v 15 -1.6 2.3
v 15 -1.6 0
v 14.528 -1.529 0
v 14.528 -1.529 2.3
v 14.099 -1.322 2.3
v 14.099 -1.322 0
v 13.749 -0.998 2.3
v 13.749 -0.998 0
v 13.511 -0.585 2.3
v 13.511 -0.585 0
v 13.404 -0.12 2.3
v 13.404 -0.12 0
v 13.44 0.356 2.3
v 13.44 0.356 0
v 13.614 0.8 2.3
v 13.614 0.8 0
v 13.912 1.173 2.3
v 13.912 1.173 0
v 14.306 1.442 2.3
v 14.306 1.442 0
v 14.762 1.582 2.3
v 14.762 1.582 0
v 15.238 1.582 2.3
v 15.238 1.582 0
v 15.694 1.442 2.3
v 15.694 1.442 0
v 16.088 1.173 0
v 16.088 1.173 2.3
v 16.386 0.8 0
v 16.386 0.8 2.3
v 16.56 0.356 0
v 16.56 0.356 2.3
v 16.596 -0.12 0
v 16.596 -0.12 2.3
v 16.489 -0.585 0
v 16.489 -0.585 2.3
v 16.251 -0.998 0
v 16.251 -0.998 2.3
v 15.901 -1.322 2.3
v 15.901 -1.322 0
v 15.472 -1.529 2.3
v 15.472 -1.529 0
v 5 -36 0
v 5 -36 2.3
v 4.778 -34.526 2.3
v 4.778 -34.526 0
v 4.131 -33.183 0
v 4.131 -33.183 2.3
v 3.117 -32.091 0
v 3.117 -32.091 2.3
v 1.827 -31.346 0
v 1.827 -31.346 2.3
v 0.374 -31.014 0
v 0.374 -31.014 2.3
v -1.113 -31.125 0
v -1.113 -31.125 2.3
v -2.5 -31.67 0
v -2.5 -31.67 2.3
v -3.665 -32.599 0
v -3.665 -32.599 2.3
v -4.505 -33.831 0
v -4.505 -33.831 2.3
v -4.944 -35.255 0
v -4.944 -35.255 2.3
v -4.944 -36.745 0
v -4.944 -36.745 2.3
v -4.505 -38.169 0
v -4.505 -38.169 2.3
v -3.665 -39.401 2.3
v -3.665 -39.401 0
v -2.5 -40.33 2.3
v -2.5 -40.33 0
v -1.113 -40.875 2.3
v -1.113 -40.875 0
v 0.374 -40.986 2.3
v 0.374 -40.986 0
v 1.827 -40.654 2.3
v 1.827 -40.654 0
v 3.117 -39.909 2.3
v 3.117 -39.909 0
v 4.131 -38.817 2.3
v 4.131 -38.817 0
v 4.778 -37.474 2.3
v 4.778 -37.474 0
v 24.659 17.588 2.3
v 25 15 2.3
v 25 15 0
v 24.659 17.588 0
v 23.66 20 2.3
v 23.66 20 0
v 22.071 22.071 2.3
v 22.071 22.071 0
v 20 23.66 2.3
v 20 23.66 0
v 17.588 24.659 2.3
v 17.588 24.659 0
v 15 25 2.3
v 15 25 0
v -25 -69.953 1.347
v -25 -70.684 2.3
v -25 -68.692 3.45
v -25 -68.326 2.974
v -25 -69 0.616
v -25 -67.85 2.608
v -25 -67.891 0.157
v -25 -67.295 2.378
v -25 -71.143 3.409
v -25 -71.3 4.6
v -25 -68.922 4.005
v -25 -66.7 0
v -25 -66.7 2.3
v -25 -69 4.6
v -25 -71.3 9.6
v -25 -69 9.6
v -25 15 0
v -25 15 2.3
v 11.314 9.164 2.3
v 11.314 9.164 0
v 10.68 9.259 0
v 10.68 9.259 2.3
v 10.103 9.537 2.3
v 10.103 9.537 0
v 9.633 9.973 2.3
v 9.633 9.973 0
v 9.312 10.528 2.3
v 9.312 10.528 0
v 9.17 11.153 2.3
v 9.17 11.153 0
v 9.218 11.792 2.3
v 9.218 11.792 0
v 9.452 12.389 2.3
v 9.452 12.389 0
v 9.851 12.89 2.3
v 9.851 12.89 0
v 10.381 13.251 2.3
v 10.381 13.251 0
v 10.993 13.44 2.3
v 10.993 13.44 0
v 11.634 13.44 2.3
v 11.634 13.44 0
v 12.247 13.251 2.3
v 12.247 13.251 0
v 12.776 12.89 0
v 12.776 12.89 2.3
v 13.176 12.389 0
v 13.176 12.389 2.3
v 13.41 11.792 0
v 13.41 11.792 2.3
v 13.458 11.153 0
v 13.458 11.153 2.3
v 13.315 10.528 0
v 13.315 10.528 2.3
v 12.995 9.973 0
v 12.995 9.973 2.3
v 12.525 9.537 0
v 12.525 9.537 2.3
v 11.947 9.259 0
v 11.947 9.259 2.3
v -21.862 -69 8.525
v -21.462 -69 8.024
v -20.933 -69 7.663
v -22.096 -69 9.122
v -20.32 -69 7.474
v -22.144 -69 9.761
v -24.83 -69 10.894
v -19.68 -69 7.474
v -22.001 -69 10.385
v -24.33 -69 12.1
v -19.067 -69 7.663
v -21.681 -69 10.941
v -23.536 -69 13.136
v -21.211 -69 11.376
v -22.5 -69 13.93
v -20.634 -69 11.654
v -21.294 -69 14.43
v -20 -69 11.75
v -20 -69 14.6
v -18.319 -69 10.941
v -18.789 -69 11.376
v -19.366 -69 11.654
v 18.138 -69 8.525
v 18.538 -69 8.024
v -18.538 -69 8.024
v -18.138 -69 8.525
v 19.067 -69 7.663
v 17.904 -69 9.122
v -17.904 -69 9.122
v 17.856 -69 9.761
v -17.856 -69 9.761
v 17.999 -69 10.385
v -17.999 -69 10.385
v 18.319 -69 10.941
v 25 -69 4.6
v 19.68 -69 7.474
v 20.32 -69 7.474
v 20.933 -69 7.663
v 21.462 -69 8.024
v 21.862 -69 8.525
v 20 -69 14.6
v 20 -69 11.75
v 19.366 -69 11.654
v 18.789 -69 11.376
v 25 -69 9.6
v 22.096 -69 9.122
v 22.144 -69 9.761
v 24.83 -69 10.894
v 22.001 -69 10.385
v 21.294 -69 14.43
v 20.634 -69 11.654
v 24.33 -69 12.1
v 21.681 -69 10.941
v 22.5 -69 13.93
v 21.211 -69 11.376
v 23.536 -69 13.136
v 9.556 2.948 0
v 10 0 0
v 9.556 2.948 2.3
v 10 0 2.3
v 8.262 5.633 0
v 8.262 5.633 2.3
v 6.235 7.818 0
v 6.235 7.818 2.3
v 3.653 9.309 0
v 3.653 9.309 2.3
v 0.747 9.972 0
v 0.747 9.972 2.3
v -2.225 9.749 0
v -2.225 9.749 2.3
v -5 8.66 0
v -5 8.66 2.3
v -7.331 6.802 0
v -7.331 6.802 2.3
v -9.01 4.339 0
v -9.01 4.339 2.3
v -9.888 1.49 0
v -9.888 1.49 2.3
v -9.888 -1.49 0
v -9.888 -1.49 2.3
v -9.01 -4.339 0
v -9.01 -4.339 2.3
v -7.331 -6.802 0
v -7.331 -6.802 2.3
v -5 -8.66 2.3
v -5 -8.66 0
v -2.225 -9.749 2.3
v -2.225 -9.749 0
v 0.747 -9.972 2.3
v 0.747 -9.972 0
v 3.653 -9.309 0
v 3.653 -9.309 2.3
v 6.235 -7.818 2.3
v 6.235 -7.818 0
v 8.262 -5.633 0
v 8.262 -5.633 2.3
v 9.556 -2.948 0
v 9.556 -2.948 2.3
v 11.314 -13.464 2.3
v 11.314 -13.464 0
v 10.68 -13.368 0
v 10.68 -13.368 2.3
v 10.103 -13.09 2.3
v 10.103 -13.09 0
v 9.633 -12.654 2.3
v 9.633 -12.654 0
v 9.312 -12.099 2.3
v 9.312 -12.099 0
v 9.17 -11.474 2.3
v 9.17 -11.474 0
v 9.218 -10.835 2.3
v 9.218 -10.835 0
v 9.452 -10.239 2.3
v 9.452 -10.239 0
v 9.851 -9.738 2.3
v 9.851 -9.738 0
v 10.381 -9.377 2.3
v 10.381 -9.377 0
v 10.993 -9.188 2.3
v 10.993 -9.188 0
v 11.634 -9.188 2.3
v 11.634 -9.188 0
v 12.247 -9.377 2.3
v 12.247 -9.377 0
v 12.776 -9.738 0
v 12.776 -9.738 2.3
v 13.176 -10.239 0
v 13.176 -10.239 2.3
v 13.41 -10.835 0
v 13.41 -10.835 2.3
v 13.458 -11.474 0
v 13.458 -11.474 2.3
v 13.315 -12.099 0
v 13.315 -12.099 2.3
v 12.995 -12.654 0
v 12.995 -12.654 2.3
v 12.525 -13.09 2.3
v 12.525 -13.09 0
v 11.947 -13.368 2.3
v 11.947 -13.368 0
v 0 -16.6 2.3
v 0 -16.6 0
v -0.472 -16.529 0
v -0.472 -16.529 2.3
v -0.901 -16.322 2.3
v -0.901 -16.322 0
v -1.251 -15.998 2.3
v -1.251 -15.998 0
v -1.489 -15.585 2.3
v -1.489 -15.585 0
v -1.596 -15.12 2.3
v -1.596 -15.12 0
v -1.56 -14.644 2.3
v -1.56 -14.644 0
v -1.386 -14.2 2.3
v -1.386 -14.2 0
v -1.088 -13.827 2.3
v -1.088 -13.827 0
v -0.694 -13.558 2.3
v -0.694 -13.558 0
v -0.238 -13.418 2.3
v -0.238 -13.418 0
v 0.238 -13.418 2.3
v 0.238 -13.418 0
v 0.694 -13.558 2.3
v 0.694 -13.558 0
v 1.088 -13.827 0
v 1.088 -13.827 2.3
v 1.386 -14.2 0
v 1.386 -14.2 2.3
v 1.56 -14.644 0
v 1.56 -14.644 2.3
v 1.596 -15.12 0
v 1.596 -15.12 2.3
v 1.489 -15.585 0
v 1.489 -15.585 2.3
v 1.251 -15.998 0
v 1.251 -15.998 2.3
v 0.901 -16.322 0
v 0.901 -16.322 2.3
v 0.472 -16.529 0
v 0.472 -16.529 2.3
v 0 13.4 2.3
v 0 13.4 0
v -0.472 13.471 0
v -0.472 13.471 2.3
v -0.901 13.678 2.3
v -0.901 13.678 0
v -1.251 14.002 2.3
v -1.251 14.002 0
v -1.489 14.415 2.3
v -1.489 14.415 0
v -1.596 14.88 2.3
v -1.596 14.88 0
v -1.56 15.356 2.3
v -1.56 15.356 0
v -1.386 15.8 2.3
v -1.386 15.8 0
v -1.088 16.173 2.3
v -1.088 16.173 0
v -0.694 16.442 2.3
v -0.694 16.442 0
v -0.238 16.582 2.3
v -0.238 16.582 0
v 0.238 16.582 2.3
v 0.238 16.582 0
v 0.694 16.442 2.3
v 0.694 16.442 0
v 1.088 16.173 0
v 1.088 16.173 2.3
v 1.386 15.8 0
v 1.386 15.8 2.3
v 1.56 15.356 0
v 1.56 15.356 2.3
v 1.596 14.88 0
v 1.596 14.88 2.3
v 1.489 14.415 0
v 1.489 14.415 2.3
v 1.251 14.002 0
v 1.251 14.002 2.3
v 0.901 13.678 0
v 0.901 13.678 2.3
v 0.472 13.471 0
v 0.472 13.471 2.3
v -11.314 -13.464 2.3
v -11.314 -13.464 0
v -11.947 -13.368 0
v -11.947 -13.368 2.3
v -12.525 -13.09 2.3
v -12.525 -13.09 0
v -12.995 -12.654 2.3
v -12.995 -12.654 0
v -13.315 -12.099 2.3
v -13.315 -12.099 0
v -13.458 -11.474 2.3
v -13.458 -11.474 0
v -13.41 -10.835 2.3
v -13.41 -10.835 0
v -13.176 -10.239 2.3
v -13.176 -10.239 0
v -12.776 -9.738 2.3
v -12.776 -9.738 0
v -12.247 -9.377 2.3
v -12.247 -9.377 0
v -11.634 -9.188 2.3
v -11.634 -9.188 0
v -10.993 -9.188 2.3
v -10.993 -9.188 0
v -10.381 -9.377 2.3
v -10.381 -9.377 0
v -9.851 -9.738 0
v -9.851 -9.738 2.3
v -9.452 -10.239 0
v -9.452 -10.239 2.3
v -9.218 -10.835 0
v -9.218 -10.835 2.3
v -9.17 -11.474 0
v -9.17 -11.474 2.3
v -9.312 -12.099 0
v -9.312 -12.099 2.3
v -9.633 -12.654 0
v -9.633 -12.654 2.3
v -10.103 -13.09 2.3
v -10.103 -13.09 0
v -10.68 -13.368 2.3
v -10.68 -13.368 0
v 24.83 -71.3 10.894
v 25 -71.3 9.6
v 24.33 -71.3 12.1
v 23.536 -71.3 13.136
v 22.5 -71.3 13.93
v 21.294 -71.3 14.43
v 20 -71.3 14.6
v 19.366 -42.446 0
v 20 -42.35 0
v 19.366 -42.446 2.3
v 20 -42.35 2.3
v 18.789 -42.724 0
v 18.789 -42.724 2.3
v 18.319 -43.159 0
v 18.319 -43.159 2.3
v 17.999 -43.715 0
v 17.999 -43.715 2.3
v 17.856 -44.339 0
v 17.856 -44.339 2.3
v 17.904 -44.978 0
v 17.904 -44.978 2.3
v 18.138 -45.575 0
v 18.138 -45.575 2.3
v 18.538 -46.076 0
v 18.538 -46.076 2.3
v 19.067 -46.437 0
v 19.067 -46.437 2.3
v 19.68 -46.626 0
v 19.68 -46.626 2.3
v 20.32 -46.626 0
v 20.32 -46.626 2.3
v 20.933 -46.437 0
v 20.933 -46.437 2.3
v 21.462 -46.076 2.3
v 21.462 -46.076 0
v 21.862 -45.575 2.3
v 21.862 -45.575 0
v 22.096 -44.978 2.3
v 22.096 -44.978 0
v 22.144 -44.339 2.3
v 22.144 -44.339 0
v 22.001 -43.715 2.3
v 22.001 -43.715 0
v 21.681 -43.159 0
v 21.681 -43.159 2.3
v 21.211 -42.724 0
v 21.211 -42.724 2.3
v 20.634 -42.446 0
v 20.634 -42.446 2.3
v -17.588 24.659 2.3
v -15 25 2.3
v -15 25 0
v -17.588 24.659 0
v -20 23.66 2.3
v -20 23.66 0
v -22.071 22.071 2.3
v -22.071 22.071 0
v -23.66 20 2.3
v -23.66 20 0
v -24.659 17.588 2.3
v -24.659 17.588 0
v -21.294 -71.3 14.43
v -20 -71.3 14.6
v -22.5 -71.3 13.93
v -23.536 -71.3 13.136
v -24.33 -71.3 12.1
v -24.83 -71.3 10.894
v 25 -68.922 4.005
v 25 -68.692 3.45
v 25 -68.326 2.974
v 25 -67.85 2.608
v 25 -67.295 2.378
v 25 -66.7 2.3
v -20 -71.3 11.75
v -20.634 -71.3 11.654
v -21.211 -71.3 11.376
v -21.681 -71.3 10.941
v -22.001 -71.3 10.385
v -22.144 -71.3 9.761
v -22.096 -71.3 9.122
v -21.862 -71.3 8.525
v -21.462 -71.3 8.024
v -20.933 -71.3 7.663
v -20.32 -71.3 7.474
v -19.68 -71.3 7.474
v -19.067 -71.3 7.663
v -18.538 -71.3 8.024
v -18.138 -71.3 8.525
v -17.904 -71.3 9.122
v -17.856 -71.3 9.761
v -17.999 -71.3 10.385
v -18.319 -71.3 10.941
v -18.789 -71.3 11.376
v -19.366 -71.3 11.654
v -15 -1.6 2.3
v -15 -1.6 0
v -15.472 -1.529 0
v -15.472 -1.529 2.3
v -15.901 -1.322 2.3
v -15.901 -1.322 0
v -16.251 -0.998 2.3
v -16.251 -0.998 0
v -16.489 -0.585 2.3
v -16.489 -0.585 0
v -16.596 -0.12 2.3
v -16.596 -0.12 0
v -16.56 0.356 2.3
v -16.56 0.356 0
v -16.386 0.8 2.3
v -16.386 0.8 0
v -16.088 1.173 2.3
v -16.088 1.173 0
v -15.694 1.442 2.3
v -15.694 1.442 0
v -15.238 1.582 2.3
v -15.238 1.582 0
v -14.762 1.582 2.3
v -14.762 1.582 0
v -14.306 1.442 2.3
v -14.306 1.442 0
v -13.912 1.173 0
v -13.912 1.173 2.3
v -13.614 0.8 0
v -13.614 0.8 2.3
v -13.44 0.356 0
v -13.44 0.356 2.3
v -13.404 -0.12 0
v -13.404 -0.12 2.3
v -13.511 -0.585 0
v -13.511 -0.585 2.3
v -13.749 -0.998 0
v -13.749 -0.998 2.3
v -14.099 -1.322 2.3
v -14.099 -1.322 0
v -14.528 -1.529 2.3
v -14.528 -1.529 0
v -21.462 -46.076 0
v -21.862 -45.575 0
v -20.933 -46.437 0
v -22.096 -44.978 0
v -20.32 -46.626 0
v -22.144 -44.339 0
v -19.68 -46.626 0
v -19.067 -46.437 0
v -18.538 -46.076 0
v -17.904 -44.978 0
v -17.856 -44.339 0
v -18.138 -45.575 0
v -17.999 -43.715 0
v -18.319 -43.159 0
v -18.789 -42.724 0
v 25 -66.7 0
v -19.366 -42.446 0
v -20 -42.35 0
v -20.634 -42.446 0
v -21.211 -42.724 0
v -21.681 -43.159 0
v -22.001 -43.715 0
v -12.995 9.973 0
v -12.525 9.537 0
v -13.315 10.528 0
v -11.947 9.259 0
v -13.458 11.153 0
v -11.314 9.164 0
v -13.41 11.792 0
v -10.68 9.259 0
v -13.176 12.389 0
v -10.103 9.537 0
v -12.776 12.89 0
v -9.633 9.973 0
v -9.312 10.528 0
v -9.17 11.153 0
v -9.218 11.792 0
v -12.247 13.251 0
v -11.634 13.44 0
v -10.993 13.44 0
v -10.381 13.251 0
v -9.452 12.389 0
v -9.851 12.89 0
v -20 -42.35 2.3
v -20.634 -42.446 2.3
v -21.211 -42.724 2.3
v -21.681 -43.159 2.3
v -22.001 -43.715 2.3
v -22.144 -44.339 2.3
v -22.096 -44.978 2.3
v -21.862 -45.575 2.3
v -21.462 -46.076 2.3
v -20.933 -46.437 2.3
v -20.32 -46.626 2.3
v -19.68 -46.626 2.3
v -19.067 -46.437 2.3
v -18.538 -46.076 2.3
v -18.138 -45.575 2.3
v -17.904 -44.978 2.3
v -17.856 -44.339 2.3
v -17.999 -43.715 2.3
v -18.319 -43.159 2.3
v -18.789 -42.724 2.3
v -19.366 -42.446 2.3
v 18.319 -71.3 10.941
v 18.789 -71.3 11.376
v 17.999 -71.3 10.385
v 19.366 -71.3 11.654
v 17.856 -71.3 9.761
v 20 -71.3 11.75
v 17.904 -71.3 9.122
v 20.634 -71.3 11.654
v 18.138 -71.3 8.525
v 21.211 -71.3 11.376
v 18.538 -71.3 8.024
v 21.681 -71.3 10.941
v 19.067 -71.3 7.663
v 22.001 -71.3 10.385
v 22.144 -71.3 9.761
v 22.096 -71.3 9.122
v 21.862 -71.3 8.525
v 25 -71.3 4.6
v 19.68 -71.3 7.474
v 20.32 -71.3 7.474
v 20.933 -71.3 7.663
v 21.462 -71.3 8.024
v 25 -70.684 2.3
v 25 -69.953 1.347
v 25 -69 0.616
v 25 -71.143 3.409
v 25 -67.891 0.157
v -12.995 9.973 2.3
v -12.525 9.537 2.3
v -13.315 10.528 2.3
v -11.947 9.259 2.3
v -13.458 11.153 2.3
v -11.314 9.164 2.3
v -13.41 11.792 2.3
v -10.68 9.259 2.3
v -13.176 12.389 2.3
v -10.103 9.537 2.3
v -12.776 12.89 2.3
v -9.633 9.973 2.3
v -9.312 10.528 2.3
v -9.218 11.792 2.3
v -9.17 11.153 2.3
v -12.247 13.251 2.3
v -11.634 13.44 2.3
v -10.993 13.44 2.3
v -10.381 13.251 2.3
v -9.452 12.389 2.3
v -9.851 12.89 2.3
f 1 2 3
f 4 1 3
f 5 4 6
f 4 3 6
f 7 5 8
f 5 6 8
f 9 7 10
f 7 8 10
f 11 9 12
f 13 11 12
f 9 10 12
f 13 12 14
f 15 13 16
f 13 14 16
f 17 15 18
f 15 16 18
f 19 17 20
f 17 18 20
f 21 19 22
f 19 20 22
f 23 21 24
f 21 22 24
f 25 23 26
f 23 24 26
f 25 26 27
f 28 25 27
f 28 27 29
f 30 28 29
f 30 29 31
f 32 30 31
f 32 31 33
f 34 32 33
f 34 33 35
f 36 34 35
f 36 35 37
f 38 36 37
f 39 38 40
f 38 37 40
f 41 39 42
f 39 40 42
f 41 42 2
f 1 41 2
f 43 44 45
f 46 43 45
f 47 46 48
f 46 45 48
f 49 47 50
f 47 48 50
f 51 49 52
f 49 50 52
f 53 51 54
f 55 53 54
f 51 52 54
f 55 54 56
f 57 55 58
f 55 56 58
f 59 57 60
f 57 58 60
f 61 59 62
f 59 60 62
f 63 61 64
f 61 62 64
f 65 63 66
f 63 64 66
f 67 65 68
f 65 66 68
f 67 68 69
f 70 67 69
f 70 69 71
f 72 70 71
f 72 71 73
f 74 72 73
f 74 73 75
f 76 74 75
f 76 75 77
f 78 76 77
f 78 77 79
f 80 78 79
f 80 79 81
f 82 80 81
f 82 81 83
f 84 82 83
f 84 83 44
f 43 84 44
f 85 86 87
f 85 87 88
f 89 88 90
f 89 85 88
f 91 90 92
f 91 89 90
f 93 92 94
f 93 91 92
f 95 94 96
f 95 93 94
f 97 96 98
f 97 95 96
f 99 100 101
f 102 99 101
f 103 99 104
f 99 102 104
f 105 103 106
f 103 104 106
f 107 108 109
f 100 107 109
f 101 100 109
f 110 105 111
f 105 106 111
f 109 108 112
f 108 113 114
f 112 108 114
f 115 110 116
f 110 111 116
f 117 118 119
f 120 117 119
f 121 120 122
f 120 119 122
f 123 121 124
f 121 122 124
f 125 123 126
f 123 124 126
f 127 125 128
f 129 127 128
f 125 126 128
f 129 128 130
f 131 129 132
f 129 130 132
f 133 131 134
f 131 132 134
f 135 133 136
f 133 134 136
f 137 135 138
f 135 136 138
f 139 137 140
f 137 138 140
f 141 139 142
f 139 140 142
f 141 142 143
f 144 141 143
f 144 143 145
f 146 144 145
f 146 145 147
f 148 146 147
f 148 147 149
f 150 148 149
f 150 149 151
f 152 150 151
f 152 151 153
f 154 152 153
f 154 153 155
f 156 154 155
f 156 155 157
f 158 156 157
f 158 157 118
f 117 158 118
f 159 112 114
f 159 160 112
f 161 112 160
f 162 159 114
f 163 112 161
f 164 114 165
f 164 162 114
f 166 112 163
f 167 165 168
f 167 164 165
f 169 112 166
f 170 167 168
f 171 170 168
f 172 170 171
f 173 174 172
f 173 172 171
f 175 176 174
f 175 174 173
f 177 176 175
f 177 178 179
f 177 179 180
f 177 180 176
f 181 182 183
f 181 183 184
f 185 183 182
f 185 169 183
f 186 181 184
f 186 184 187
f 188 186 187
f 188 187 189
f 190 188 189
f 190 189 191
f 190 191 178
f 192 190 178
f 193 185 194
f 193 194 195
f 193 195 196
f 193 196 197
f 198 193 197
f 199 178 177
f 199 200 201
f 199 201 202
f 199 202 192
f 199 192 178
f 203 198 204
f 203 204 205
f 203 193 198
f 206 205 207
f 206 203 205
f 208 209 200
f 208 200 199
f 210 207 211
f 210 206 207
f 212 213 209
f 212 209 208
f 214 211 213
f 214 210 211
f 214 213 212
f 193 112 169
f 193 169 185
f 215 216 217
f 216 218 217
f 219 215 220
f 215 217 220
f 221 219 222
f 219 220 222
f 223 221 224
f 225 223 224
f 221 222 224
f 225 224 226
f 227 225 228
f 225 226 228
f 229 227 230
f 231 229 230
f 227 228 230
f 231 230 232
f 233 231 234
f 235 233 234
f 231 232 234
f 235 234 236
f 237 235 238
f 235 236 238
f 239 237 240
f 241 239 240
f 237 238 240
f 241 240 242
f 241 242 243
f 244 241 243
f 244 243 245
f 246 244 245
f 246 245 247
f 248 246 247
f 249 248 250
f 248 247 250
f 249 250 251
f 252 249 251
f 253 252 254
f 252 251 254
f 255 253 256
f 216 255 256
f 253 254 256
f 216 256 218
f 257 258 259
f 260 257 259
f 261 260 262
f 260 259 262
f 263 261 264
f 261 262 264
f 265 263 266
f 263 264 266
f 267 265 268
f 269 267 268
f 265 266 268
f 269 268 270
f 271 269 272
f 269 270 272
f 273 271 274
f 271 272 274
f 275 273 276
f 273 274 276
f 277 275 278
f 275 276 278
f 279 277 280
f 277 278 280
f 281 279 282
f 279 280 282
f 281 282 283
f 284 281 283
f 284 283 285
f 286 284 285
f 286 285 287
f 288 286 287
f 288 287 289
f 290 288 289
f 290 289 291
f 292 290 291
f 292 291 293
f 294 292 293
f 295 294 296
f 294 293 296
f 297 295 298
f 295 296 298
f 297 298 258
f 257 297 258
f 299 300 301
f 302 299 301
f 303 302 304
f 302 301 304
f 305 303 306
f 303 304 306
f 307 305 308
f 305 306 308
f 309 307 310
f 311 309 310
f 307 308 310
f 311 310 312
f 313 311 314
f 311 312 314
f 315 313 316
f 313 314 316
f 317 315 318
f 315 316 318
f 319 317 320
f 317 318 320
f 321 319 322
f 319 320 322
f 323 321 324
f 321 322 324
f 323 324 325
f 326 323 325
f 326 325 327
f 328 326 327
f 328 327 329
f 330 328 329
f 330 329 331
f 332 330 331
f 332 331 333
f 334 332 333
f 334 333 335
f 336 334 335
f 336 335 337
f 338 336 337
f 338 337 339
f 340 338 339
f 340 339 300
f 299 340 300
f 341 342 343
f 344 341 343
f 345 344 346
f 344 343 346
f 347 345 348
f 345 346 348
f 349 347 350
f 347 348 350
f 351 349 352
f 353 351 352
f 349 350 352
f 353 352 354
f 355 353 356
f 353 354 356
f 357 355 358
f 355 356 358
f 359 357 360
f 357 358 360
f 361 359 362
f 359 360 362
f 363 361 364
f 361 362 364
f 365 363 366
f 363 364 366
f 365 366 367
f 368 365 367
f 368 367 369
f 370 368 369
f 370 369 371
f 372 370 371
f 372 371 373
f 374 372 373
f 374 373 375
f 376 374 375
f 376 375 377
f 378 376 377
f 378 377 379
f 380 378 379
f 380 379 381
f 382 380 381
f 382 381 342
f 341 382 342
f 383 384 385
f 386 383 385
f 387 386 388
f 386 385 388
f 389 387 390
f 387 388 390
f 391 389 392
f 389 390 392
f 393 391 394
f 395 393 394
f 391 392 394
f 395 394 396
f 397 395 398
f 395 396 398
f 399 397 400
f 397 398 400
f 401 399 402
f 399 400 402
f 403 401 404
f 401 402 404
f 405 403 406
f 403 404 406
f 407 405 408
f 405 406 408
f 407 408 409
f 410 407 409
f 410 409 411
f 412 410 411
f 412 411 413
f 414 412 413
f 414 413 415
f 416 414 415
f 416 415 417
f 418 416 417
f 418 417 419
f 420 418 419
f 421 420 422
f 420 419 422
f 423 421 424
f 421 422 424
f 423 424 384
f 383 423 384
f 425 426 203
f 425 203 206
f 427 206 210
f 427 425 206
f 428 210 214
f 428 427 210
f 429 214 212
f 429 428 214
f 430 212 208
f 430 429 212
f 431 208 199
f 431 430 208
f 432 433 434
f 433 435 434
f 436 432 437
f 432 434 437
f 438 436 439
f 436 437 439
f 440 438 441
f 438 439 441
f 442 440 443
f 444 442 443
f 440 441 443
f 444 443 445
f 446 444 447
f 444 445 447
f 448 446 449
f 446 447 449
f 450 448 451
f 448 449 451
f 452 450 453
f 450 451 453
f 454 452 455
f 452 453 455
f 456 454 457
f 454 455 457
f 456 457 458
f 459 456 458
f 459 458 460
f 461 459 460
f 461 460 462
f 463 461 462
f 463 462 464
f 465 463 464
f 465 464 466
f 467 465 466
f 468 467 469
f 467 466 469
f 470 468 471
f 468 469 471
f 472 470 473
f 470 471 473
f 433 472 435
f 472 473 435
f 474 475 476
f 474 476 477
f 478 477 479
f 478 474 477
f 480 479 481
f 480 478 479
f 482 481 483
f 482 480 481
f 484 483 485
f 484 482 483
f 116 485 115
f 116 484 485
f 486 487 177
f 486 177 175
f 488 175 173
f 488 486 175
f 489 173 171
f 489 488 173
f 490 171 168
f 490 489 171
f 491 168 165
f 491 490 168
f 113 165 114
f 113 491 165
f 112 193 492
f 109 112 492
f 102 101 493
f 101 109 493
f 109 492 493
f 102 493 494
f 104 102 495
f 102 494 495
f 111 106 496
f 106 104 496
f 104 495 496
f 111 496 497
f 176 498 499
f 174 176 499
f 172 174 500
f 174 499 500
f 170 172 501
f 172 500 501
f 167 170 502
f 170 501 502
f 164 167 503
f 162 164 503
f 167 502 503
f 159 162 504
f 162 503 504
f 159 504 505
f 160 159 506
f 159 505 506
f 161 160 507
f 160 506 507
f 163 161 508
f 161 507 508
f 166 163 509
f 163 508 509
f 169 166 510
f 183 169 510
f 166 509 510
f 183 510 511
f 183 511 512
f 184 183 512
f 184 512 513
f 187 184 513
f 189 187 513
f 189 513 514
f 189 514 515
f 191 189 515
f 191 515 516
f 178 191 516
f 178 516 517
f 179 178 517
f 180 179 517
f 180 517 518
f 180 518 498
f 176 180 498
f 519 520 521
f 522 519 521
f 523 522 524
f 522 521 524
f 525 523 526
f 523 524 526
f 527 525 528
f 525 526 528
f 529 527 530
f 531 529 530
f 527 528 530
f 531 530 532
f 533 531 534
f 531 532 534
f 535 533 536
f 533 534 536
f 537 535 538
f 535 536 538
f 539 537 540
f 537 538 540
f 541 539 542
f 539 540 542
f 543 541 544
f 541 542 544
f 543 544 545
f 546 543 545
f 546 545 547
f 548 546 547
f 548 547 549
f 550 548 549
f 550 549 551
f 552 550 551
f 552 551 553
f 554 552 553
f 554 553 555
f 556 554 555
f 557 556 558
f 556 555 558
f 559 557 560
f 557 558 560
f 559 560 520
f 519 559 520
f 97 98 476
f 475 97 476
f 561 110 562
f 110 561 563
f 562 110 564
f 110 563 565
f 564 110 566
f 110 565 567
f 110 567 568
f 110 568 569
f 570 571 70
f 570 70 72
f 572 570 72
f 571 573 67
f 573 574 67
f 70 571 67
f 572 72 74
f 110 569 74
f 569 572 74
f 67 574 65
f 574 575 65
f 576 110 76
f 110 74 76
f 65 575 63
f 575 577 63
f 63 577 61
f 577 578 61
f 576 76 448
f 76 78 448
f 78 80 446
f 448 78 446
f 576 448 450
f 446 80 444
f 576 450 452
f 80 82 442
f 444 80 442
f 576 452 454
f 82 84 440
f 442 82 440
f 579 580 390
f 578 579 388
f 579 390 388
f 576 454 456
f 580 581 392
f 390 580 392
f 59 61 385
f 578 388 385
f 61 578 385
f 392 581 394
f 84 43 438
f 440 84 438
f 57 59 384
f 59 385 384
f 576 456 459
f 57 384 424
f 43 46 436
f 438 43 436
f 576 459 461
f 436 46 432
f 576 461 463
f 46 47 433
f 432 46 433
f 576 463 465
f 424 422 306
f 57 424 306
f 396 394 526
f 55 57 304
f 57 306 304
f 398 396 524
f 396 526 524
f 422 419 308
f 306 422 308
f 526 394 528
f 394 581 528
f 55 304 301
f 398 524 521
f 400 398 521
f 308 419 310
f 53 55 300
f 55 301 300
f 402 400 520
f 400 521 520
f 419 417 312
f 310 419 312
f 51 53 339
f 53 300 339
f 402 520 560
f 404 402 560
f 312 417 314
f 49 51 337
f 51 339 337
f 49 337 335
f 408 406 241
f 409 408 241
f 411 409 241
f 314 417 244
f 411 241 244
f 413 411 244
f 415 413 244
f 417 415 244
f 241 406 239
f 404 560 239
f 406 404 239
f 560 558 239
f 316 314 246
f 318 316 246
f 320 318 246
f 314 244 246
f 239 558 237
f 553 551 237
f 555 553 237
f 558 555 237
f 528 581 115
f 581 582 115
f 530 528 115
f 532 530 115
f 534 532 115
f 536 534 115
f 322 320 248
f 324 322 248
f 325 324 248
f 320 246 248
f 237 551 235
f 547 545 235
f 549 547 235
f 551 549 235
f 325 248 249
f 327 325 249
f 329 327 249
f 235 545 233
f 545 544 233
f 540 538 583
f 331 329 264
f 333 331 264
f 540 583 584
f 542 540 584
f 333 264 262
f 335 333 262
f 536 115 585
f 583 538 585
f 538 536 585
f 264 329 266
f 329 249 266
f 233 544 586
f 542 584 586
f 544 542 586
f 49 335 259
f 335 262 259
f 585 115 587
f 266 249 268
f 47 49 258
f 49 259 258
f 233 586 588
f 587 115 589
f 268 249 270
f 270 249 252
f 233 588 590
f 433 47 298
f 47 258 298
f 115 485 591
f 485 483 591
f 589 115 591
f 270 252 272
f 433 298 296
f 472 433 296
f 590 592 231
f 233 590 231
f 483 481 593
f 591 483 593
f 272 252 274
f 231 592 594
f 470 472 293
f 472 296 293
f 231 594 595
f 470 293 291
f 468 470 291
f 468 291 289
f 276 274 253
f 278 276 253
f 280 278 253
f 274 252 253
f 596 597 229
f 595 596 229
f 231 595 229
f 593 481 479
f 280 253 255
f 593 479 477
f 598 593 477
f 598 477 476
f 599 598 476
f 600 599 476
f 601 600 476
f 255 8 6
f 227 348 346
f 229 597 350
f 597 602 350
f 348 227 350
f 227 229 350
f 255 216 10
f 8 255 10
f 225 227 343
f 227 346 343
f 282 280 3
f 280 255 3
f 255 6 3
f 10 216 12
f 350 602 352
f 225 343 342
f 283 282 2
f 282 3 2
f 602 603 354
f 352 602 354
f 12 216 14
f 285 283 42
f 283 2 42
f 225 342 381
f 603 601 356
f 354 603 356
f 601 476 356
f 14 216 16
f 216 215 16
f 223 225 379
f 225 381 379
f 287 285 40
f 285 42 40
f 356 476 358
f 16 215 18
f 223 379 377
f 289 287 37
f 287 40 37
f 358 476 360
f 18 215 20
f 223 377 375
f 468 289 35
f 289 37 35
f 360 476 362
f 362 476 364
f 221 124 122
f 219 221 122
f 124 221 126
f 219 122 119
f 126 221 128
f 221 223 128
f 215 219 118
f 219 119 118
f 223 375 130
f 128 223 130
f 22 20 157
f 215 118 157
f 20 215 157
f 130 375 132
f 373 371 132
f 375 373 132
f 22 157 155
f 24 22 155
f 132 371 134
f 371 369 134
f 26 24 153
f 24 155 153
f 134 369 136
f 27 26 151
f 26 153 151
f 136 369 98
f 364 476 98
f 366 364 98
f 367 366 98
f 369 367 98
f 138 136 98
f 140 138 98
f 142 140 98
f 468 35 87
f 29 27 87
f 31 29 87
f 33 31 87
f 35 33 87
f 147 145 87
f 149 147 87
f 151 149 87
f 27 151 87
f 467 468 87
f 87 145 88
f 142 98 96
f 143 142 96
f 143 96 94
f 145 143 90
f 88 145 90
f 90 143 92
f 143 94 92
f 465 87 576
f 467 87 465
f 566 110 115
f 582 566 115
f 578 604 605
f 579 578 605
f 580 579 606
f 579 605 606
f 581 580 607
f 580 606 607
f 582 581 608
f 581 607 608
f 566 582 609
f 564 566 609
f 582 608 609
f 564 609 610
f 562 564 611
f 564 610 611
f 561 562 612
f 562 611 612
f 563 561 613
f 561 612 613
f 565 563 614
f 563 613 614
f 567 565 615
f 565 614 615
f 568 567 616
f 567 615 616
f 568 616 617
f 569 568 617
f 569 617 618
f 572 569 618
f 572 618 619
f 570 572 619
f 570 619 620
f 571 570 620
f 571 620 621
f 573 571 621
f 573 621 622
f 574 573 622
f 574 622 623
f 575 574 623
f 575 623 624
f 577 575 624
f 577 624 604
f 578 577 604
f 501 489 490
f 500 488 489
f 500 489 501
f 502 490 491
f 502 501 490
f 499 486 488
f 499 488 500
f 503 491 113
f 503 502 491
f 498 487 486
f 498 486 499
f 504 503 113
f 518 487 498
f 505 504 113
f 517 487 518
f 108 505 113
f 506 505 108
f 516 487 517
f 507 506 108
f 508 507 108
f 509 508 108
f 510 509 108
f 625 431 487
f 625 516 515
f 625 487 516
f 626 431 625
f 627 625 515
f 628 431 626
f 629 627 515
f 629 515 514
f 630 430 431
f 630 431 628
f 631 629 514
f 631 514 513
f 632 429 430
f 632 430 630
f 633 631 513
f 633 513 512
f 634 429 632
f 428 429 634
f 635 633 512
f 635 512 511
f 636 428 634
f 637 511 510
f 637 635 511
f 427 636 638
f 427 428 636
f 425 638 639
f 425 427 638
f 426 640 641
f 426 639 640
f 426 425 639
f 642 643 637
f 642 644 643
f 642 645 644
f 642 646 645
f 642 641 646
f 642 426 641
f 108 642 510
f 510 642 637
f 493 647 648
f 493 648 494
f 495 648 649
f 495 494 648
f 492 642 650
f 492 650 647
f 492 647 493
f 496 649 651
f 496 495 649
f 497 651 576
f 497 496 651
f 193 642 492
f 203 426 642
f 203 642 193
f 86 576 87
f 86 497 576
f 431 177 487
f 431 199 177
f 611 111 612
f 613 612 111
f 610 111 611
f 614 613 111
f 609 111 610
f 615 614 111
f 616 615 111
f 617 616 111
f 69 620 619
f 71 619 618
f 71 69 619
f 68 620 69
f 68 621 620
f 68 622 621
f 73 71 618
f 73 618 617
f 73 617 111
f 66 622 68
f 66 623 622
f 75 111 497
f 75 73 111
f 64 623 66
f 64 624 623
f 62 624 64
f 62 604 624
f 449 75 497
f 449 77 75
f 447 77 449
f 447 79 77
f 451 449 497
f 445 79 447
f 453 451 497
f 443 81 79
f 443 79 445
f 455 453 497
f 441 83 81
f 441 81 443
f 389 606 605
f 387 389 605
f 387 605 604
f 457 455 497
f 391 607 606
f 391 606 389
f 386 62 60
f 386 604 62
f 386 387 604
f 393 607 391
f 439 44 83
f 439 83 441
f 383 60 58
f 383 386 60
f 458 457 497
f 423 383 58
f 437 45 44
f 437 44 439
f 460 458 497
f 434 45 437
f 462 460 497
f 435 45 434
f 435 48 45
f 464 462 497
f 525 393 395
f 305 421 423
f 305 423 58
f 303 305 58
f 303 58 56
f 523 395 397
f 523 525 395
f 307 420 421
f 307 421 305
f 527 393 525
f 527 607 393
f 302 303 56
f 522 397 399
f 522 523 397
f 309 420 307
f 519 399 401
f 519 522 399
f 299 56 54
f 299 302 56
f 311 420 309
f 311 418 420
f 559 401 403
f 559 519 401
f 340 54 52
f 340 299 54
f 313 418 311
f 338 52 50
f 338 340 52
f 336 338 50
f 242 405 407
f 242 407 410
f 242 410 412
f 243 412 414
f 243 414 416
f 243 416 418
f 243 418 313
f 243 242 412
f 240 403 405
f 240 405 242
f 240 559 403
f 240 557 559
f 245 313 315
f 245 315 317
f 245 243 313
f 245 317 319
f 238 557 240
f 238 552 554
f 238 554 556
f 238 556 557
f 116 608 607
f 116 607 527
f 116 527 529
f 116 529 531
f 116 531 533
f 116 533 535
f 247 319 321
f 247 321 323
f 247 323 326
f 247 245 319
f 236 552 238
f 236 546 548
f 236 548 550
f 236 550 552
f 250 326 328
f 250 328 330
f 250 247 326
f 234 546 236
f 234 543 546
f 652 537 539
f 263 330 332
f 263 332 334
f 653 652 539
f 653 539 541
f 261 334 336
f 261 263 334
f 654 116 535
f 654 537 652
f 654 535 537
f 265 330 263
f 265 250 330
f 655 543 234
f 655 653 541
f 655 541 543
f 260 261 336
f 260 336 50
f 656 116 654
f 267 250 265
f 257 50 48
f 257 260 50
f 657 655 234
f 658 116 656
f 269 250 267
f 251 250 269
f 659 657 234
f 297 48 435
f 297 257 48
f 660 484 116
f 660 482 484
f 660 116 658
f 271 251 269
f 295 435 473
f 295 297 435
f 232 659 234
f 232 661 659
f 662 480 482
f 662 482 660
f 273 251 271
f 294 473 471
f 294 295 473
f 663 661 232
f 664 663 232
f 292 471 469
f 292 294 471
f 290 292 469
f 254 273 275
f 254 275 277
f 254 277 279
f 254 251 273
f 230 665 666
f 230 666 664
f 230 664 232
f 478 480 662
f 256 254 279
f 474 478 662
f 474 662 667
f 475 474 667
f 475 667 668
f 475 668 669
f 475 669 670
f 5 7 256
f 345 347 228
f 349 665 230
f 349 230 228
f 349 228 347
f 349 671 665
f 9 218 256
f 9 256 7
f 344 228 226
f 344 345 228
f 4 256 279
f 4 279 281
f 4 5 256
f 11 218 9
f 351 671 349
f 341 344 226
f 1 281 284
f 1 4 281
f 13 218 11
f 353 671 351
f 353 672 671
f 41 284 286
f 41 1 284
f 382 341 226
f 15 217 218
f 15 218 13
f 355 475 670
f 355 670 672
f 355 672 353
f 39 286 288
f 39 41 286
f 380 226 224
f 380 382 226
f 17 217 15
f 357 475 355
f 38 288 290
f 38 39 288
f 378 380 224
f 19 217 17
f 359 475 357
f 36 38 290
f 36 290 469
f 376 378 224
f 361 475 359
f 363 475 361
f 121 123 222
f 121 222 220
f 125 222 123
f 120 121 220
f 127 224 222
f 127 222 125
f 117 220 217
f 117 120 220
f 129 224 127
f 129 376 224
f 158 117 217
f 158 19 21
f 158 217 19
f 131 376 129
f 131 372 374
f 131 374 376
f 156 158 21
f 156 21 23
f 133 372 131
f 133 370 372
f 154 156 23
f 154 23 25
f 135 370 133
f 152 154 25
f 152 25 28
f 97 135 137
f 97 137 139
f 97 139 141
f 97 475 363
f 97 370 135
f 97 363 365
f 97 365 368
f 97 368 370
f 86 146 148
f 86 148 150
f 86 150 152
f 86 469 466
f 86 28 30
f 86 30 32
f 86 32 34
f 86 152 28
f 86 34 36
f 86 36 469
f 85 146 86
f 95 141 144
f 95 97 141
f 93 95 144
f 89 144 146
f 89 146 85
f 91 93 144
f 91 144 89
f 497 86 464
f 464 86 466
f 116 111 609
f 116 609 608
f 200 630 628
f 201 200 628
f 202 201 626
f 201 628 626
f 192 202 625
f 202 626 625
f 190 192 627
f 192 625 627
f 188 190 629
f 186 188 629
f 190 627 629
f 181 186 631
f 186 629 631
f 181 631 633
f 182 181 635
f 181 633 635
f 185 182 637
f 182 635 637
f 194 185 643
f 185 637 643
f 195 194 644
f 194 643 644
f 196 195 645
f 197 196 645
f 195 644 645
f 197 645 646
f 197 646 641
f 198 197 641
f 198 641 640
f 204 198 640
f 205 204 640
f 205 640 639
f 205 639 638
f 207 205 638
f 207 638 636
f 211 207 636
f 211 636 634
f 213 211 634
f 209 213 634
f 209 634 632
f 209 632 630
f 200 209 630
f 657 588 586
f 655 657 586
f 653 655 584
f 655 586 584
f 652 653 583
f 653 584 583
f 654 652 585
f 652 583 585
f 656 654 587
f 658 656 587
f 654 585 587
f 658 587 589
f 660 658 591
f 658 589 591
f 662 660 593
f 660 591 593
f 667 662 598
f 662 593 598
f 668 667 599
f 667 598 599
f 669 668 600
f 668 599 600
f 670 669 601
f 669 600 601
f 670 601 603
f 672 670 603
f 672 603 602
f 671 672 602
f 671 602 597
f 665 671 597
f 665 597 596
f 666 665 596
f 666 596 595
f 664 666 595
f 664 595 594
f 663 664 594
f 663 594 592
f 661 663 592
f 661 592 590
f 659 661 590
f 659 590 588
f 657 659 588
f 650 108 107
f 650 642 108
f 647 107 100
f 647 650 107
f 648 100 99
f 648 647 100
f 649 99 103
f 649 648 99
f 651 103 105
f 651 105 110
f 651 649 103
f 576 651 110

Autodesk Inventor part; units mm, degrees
ref_plane "YZ Plane" through (0, 0, 0) normal (1, 0, 0) x (0, 1, 0)
ref_plane "XZ Plane" through (0, 0, 0) normal (0, 1, 0) x (-1, 0, 0)
ref_plane "XY Plane" through (0, 0, 0) normal (0, 0, 1) x (1, 0, 0)
sketch "スケッチ1" plane through (0, 0, 0) normal (0, 0, 1) x (1, 0, 0)
  line L0 (-25, -71.3) -> (25, -71.3)
  line L1 (25, -71.3) -> (25, 25)
  line L2 (25, 25) -> (-25, 25)
  line L3 (-25, 25) -> (-25, -71.3)
  line L4 (-25, -71.3) -> (25, 25) construction
  line L5 (25, -71.3) -> (-25, 25) construction
  circle A0 centre (0, 0) radius 19 construction
  point P0 (0, -23.15)
  point P1 (0, -23.15)
  dimension "d0" = 38
  dimension "d1" = 50
  dimension "d2" = 25
  dimension "d3" = 71.3
extrude "プレート1" add sketch "スケッチ1" along normal blind 2.3
sketch "スケッチ9" plane through (25, -69, 0) normal (0, -1, 0) x (1, 0, 0)
  line L0 (-50, 0) -> (0, 0)
  line L1 (0, 0) -> (0, 14.6)
  line L2 (0, 14.6) -> (-50, 14.6)
  line L3 (-50, 14.6) -> (-50, 0)
edge flange "フランジ3" height 14.6 angle 90 thickness 2.3 bend radius 2.3 thickness toward (0, -1, 0) relief tear relief width 2.3 relief depth 1.15 edges at (0, -71.3, 2.3) wall of the first edge with corners at (-25, -69, 0) (25, -69, 0) (25, -69, 14.6) (-25, -69, 14.6)
bend "曲げ3"
corner "コーナー3"
fillet "コーナーR1" radius 5 2 edges at (25, -70.15, 14.6) (-25, -70.15, 14.6)
sketch "スケッチ4" plane through (0, 0, 2.3) normal (0, 0, 1) x (1, 0, 0)
  circle A0 centre (0, 0) radius 15
  point P0 (0, 15)
  point P1 (-15, 0)
  point P2 (0, -15)
  point P3 (15, 0)
  dimension "d26" = 30
  dimension "d29" = 360
hole "穴1" at (0, 15, 2.3) at (-15, 0, 2.3) at (0, -15, 2.3) at (15, 0, 2.3) direction (0, 0, -1) diameter 3.2 end through all clearance for "Flat Head Machine Screw" size "M3" standard "Ansi Metric M Profile"
sketch "スケッチ5" plane through (0, 0, 2.3) normal (0, 0, 1) x (1, 0, 0)
  circle A0 centre (0, 0) radius 16
  point P0 (-11.3137, 11.3137)
  point P1 (-11.3137, -11.3137)
  point P2 (11.3137, -11.3137)
  point P3 (11.3137, 11.3137)
  dimension "d38" = 32
  dimension "d41" = 360
hole "穴2" at (-11.3137, 11.3137, 2.3) at (-11.3137, -11.3137, 2.3) at (11.3137, -11.3137, 2.3) at (11.3137, 11.3137, 2.3) direction (0, 0, -1) diameter 4.3 end through all clearance for "Flat Head Machine Screw" size "M4" standard "Ansi Metric M Profile"
sketch "スケッチ6" plane through (0, 0, 2.3) normal (0, 0, 1) x (1, 0, 0)
  circle A0 centre (0, 0) radius 10
  dimension "d50" = 20
extrude "押し出し1" cut sketch "スケッチ6" against normal blind 10
sketch "スケッチ7" plane through (-25, -69, -2.3) normal (0, 1, 0) x (1, 0, 0)
  line L0 (5, -16.9) -> (45, -16.9) projected
  line L1 (0, -6.9) -> (0, -11.9) projected
  line L2 (50, -6.9) -> (50, -11.9) projected
  point P0 (18, -2.3)
  point P1 (45, -11.9)
  point P2 (5, -11.9)
  dimension "d76" = 5
  dimension "d77" = 5
  dimension "d78" = 5
hole "穴3" at (20, -69, 9.6) at (-20, -69, 9.6) direction (0, -1, 0) diameter 4.3 end through all clearance for "Flat Head Machine Screw" size "M4" standard "Ansi Metric M Profile"
fillet "コーナーR3" radius 10 2 edges at (-25, 25, 1.15) (25, 25, 1.15)
sketch "スケッチ10" plane through (0, 0, 0) normal (0, 0, -1) x (-1, 0, 0)
  line L0 (-25, -66.7) -> (-25, 15) projected
  line L1 (25, 15) -> (25, -66.7) projected
  circle A0 centre (-20, -44.5) radius 4
  circle A1 centre (0, 0) radius 45
  point P0 (20, -44.5)
  dimension "d80" = 5
  dimension "d81" = 5
  dimension "d82" = 44.5
  dimension "d83" = 8
  dimension "d84" = 90
hole "穴4" at (20, -44.5, 0) at (-20, -44.5, 0) direction (0, 0, 1) diameter 4.3 end through all clearance for "Flat Head Machine Screw" size "M4" standard "Ansi Metric M Profile"
sketch "スケッチ11" plane through (0, 0, 2.3) normal (0, 0, 1) x (1, 0, 0)
  circle A0 centre (0, -36) radius 5
  point P0 (0, 0)
  dimension "d92" = 10
  dimension "d93" = 36
extrude "押し出し3" cut sketch "スケッチ11" against normal blind 10
equation "\"d36\" = Thickness"
equation "\"d48\" = Thickness"
equation "\"d77\" = d76"
equation "\"d61\" = Thickness"
equation "\"d90\" = Thickness"
equation "\"d4\" = Thickness"
equation "\"d66\" = BendReliefWidth"
equation "\"d67\" = BendReliefDepth"
equation "\"d68\" = MinimumRemnant"
equation "\"d69\" = TransitionRadius"
equation "\"d72\" = BendRadius"
equation "\"d73\" = CornerReliefSize"
equation "\"d74\" = GapSize"
equation "\"d75\" = JacobiRadiusSize"
equation "\"d2\" = 0.5 * d1"
equation "\"BendRadius\" = Thickness"
equation "\"BendReliefWidth\" = Thickness"
equation "\"BendReliefDepth\" = 0.5 * Thickness"
equation "\"CornerReliefSize\" = 4 * Thickness"
equation "\"MinimumRemnant\" = 2 * Thickness"
equation "\"TransitionRadius\" = BendRadius"
equation "\"JacobiRadiusSize\" = BendRadius"
equation "\"GapSize\" = Thickness"
equation "\"Thickness\" = 2.3"
properties part number "plate8" material "鋼、炭素鋼"
